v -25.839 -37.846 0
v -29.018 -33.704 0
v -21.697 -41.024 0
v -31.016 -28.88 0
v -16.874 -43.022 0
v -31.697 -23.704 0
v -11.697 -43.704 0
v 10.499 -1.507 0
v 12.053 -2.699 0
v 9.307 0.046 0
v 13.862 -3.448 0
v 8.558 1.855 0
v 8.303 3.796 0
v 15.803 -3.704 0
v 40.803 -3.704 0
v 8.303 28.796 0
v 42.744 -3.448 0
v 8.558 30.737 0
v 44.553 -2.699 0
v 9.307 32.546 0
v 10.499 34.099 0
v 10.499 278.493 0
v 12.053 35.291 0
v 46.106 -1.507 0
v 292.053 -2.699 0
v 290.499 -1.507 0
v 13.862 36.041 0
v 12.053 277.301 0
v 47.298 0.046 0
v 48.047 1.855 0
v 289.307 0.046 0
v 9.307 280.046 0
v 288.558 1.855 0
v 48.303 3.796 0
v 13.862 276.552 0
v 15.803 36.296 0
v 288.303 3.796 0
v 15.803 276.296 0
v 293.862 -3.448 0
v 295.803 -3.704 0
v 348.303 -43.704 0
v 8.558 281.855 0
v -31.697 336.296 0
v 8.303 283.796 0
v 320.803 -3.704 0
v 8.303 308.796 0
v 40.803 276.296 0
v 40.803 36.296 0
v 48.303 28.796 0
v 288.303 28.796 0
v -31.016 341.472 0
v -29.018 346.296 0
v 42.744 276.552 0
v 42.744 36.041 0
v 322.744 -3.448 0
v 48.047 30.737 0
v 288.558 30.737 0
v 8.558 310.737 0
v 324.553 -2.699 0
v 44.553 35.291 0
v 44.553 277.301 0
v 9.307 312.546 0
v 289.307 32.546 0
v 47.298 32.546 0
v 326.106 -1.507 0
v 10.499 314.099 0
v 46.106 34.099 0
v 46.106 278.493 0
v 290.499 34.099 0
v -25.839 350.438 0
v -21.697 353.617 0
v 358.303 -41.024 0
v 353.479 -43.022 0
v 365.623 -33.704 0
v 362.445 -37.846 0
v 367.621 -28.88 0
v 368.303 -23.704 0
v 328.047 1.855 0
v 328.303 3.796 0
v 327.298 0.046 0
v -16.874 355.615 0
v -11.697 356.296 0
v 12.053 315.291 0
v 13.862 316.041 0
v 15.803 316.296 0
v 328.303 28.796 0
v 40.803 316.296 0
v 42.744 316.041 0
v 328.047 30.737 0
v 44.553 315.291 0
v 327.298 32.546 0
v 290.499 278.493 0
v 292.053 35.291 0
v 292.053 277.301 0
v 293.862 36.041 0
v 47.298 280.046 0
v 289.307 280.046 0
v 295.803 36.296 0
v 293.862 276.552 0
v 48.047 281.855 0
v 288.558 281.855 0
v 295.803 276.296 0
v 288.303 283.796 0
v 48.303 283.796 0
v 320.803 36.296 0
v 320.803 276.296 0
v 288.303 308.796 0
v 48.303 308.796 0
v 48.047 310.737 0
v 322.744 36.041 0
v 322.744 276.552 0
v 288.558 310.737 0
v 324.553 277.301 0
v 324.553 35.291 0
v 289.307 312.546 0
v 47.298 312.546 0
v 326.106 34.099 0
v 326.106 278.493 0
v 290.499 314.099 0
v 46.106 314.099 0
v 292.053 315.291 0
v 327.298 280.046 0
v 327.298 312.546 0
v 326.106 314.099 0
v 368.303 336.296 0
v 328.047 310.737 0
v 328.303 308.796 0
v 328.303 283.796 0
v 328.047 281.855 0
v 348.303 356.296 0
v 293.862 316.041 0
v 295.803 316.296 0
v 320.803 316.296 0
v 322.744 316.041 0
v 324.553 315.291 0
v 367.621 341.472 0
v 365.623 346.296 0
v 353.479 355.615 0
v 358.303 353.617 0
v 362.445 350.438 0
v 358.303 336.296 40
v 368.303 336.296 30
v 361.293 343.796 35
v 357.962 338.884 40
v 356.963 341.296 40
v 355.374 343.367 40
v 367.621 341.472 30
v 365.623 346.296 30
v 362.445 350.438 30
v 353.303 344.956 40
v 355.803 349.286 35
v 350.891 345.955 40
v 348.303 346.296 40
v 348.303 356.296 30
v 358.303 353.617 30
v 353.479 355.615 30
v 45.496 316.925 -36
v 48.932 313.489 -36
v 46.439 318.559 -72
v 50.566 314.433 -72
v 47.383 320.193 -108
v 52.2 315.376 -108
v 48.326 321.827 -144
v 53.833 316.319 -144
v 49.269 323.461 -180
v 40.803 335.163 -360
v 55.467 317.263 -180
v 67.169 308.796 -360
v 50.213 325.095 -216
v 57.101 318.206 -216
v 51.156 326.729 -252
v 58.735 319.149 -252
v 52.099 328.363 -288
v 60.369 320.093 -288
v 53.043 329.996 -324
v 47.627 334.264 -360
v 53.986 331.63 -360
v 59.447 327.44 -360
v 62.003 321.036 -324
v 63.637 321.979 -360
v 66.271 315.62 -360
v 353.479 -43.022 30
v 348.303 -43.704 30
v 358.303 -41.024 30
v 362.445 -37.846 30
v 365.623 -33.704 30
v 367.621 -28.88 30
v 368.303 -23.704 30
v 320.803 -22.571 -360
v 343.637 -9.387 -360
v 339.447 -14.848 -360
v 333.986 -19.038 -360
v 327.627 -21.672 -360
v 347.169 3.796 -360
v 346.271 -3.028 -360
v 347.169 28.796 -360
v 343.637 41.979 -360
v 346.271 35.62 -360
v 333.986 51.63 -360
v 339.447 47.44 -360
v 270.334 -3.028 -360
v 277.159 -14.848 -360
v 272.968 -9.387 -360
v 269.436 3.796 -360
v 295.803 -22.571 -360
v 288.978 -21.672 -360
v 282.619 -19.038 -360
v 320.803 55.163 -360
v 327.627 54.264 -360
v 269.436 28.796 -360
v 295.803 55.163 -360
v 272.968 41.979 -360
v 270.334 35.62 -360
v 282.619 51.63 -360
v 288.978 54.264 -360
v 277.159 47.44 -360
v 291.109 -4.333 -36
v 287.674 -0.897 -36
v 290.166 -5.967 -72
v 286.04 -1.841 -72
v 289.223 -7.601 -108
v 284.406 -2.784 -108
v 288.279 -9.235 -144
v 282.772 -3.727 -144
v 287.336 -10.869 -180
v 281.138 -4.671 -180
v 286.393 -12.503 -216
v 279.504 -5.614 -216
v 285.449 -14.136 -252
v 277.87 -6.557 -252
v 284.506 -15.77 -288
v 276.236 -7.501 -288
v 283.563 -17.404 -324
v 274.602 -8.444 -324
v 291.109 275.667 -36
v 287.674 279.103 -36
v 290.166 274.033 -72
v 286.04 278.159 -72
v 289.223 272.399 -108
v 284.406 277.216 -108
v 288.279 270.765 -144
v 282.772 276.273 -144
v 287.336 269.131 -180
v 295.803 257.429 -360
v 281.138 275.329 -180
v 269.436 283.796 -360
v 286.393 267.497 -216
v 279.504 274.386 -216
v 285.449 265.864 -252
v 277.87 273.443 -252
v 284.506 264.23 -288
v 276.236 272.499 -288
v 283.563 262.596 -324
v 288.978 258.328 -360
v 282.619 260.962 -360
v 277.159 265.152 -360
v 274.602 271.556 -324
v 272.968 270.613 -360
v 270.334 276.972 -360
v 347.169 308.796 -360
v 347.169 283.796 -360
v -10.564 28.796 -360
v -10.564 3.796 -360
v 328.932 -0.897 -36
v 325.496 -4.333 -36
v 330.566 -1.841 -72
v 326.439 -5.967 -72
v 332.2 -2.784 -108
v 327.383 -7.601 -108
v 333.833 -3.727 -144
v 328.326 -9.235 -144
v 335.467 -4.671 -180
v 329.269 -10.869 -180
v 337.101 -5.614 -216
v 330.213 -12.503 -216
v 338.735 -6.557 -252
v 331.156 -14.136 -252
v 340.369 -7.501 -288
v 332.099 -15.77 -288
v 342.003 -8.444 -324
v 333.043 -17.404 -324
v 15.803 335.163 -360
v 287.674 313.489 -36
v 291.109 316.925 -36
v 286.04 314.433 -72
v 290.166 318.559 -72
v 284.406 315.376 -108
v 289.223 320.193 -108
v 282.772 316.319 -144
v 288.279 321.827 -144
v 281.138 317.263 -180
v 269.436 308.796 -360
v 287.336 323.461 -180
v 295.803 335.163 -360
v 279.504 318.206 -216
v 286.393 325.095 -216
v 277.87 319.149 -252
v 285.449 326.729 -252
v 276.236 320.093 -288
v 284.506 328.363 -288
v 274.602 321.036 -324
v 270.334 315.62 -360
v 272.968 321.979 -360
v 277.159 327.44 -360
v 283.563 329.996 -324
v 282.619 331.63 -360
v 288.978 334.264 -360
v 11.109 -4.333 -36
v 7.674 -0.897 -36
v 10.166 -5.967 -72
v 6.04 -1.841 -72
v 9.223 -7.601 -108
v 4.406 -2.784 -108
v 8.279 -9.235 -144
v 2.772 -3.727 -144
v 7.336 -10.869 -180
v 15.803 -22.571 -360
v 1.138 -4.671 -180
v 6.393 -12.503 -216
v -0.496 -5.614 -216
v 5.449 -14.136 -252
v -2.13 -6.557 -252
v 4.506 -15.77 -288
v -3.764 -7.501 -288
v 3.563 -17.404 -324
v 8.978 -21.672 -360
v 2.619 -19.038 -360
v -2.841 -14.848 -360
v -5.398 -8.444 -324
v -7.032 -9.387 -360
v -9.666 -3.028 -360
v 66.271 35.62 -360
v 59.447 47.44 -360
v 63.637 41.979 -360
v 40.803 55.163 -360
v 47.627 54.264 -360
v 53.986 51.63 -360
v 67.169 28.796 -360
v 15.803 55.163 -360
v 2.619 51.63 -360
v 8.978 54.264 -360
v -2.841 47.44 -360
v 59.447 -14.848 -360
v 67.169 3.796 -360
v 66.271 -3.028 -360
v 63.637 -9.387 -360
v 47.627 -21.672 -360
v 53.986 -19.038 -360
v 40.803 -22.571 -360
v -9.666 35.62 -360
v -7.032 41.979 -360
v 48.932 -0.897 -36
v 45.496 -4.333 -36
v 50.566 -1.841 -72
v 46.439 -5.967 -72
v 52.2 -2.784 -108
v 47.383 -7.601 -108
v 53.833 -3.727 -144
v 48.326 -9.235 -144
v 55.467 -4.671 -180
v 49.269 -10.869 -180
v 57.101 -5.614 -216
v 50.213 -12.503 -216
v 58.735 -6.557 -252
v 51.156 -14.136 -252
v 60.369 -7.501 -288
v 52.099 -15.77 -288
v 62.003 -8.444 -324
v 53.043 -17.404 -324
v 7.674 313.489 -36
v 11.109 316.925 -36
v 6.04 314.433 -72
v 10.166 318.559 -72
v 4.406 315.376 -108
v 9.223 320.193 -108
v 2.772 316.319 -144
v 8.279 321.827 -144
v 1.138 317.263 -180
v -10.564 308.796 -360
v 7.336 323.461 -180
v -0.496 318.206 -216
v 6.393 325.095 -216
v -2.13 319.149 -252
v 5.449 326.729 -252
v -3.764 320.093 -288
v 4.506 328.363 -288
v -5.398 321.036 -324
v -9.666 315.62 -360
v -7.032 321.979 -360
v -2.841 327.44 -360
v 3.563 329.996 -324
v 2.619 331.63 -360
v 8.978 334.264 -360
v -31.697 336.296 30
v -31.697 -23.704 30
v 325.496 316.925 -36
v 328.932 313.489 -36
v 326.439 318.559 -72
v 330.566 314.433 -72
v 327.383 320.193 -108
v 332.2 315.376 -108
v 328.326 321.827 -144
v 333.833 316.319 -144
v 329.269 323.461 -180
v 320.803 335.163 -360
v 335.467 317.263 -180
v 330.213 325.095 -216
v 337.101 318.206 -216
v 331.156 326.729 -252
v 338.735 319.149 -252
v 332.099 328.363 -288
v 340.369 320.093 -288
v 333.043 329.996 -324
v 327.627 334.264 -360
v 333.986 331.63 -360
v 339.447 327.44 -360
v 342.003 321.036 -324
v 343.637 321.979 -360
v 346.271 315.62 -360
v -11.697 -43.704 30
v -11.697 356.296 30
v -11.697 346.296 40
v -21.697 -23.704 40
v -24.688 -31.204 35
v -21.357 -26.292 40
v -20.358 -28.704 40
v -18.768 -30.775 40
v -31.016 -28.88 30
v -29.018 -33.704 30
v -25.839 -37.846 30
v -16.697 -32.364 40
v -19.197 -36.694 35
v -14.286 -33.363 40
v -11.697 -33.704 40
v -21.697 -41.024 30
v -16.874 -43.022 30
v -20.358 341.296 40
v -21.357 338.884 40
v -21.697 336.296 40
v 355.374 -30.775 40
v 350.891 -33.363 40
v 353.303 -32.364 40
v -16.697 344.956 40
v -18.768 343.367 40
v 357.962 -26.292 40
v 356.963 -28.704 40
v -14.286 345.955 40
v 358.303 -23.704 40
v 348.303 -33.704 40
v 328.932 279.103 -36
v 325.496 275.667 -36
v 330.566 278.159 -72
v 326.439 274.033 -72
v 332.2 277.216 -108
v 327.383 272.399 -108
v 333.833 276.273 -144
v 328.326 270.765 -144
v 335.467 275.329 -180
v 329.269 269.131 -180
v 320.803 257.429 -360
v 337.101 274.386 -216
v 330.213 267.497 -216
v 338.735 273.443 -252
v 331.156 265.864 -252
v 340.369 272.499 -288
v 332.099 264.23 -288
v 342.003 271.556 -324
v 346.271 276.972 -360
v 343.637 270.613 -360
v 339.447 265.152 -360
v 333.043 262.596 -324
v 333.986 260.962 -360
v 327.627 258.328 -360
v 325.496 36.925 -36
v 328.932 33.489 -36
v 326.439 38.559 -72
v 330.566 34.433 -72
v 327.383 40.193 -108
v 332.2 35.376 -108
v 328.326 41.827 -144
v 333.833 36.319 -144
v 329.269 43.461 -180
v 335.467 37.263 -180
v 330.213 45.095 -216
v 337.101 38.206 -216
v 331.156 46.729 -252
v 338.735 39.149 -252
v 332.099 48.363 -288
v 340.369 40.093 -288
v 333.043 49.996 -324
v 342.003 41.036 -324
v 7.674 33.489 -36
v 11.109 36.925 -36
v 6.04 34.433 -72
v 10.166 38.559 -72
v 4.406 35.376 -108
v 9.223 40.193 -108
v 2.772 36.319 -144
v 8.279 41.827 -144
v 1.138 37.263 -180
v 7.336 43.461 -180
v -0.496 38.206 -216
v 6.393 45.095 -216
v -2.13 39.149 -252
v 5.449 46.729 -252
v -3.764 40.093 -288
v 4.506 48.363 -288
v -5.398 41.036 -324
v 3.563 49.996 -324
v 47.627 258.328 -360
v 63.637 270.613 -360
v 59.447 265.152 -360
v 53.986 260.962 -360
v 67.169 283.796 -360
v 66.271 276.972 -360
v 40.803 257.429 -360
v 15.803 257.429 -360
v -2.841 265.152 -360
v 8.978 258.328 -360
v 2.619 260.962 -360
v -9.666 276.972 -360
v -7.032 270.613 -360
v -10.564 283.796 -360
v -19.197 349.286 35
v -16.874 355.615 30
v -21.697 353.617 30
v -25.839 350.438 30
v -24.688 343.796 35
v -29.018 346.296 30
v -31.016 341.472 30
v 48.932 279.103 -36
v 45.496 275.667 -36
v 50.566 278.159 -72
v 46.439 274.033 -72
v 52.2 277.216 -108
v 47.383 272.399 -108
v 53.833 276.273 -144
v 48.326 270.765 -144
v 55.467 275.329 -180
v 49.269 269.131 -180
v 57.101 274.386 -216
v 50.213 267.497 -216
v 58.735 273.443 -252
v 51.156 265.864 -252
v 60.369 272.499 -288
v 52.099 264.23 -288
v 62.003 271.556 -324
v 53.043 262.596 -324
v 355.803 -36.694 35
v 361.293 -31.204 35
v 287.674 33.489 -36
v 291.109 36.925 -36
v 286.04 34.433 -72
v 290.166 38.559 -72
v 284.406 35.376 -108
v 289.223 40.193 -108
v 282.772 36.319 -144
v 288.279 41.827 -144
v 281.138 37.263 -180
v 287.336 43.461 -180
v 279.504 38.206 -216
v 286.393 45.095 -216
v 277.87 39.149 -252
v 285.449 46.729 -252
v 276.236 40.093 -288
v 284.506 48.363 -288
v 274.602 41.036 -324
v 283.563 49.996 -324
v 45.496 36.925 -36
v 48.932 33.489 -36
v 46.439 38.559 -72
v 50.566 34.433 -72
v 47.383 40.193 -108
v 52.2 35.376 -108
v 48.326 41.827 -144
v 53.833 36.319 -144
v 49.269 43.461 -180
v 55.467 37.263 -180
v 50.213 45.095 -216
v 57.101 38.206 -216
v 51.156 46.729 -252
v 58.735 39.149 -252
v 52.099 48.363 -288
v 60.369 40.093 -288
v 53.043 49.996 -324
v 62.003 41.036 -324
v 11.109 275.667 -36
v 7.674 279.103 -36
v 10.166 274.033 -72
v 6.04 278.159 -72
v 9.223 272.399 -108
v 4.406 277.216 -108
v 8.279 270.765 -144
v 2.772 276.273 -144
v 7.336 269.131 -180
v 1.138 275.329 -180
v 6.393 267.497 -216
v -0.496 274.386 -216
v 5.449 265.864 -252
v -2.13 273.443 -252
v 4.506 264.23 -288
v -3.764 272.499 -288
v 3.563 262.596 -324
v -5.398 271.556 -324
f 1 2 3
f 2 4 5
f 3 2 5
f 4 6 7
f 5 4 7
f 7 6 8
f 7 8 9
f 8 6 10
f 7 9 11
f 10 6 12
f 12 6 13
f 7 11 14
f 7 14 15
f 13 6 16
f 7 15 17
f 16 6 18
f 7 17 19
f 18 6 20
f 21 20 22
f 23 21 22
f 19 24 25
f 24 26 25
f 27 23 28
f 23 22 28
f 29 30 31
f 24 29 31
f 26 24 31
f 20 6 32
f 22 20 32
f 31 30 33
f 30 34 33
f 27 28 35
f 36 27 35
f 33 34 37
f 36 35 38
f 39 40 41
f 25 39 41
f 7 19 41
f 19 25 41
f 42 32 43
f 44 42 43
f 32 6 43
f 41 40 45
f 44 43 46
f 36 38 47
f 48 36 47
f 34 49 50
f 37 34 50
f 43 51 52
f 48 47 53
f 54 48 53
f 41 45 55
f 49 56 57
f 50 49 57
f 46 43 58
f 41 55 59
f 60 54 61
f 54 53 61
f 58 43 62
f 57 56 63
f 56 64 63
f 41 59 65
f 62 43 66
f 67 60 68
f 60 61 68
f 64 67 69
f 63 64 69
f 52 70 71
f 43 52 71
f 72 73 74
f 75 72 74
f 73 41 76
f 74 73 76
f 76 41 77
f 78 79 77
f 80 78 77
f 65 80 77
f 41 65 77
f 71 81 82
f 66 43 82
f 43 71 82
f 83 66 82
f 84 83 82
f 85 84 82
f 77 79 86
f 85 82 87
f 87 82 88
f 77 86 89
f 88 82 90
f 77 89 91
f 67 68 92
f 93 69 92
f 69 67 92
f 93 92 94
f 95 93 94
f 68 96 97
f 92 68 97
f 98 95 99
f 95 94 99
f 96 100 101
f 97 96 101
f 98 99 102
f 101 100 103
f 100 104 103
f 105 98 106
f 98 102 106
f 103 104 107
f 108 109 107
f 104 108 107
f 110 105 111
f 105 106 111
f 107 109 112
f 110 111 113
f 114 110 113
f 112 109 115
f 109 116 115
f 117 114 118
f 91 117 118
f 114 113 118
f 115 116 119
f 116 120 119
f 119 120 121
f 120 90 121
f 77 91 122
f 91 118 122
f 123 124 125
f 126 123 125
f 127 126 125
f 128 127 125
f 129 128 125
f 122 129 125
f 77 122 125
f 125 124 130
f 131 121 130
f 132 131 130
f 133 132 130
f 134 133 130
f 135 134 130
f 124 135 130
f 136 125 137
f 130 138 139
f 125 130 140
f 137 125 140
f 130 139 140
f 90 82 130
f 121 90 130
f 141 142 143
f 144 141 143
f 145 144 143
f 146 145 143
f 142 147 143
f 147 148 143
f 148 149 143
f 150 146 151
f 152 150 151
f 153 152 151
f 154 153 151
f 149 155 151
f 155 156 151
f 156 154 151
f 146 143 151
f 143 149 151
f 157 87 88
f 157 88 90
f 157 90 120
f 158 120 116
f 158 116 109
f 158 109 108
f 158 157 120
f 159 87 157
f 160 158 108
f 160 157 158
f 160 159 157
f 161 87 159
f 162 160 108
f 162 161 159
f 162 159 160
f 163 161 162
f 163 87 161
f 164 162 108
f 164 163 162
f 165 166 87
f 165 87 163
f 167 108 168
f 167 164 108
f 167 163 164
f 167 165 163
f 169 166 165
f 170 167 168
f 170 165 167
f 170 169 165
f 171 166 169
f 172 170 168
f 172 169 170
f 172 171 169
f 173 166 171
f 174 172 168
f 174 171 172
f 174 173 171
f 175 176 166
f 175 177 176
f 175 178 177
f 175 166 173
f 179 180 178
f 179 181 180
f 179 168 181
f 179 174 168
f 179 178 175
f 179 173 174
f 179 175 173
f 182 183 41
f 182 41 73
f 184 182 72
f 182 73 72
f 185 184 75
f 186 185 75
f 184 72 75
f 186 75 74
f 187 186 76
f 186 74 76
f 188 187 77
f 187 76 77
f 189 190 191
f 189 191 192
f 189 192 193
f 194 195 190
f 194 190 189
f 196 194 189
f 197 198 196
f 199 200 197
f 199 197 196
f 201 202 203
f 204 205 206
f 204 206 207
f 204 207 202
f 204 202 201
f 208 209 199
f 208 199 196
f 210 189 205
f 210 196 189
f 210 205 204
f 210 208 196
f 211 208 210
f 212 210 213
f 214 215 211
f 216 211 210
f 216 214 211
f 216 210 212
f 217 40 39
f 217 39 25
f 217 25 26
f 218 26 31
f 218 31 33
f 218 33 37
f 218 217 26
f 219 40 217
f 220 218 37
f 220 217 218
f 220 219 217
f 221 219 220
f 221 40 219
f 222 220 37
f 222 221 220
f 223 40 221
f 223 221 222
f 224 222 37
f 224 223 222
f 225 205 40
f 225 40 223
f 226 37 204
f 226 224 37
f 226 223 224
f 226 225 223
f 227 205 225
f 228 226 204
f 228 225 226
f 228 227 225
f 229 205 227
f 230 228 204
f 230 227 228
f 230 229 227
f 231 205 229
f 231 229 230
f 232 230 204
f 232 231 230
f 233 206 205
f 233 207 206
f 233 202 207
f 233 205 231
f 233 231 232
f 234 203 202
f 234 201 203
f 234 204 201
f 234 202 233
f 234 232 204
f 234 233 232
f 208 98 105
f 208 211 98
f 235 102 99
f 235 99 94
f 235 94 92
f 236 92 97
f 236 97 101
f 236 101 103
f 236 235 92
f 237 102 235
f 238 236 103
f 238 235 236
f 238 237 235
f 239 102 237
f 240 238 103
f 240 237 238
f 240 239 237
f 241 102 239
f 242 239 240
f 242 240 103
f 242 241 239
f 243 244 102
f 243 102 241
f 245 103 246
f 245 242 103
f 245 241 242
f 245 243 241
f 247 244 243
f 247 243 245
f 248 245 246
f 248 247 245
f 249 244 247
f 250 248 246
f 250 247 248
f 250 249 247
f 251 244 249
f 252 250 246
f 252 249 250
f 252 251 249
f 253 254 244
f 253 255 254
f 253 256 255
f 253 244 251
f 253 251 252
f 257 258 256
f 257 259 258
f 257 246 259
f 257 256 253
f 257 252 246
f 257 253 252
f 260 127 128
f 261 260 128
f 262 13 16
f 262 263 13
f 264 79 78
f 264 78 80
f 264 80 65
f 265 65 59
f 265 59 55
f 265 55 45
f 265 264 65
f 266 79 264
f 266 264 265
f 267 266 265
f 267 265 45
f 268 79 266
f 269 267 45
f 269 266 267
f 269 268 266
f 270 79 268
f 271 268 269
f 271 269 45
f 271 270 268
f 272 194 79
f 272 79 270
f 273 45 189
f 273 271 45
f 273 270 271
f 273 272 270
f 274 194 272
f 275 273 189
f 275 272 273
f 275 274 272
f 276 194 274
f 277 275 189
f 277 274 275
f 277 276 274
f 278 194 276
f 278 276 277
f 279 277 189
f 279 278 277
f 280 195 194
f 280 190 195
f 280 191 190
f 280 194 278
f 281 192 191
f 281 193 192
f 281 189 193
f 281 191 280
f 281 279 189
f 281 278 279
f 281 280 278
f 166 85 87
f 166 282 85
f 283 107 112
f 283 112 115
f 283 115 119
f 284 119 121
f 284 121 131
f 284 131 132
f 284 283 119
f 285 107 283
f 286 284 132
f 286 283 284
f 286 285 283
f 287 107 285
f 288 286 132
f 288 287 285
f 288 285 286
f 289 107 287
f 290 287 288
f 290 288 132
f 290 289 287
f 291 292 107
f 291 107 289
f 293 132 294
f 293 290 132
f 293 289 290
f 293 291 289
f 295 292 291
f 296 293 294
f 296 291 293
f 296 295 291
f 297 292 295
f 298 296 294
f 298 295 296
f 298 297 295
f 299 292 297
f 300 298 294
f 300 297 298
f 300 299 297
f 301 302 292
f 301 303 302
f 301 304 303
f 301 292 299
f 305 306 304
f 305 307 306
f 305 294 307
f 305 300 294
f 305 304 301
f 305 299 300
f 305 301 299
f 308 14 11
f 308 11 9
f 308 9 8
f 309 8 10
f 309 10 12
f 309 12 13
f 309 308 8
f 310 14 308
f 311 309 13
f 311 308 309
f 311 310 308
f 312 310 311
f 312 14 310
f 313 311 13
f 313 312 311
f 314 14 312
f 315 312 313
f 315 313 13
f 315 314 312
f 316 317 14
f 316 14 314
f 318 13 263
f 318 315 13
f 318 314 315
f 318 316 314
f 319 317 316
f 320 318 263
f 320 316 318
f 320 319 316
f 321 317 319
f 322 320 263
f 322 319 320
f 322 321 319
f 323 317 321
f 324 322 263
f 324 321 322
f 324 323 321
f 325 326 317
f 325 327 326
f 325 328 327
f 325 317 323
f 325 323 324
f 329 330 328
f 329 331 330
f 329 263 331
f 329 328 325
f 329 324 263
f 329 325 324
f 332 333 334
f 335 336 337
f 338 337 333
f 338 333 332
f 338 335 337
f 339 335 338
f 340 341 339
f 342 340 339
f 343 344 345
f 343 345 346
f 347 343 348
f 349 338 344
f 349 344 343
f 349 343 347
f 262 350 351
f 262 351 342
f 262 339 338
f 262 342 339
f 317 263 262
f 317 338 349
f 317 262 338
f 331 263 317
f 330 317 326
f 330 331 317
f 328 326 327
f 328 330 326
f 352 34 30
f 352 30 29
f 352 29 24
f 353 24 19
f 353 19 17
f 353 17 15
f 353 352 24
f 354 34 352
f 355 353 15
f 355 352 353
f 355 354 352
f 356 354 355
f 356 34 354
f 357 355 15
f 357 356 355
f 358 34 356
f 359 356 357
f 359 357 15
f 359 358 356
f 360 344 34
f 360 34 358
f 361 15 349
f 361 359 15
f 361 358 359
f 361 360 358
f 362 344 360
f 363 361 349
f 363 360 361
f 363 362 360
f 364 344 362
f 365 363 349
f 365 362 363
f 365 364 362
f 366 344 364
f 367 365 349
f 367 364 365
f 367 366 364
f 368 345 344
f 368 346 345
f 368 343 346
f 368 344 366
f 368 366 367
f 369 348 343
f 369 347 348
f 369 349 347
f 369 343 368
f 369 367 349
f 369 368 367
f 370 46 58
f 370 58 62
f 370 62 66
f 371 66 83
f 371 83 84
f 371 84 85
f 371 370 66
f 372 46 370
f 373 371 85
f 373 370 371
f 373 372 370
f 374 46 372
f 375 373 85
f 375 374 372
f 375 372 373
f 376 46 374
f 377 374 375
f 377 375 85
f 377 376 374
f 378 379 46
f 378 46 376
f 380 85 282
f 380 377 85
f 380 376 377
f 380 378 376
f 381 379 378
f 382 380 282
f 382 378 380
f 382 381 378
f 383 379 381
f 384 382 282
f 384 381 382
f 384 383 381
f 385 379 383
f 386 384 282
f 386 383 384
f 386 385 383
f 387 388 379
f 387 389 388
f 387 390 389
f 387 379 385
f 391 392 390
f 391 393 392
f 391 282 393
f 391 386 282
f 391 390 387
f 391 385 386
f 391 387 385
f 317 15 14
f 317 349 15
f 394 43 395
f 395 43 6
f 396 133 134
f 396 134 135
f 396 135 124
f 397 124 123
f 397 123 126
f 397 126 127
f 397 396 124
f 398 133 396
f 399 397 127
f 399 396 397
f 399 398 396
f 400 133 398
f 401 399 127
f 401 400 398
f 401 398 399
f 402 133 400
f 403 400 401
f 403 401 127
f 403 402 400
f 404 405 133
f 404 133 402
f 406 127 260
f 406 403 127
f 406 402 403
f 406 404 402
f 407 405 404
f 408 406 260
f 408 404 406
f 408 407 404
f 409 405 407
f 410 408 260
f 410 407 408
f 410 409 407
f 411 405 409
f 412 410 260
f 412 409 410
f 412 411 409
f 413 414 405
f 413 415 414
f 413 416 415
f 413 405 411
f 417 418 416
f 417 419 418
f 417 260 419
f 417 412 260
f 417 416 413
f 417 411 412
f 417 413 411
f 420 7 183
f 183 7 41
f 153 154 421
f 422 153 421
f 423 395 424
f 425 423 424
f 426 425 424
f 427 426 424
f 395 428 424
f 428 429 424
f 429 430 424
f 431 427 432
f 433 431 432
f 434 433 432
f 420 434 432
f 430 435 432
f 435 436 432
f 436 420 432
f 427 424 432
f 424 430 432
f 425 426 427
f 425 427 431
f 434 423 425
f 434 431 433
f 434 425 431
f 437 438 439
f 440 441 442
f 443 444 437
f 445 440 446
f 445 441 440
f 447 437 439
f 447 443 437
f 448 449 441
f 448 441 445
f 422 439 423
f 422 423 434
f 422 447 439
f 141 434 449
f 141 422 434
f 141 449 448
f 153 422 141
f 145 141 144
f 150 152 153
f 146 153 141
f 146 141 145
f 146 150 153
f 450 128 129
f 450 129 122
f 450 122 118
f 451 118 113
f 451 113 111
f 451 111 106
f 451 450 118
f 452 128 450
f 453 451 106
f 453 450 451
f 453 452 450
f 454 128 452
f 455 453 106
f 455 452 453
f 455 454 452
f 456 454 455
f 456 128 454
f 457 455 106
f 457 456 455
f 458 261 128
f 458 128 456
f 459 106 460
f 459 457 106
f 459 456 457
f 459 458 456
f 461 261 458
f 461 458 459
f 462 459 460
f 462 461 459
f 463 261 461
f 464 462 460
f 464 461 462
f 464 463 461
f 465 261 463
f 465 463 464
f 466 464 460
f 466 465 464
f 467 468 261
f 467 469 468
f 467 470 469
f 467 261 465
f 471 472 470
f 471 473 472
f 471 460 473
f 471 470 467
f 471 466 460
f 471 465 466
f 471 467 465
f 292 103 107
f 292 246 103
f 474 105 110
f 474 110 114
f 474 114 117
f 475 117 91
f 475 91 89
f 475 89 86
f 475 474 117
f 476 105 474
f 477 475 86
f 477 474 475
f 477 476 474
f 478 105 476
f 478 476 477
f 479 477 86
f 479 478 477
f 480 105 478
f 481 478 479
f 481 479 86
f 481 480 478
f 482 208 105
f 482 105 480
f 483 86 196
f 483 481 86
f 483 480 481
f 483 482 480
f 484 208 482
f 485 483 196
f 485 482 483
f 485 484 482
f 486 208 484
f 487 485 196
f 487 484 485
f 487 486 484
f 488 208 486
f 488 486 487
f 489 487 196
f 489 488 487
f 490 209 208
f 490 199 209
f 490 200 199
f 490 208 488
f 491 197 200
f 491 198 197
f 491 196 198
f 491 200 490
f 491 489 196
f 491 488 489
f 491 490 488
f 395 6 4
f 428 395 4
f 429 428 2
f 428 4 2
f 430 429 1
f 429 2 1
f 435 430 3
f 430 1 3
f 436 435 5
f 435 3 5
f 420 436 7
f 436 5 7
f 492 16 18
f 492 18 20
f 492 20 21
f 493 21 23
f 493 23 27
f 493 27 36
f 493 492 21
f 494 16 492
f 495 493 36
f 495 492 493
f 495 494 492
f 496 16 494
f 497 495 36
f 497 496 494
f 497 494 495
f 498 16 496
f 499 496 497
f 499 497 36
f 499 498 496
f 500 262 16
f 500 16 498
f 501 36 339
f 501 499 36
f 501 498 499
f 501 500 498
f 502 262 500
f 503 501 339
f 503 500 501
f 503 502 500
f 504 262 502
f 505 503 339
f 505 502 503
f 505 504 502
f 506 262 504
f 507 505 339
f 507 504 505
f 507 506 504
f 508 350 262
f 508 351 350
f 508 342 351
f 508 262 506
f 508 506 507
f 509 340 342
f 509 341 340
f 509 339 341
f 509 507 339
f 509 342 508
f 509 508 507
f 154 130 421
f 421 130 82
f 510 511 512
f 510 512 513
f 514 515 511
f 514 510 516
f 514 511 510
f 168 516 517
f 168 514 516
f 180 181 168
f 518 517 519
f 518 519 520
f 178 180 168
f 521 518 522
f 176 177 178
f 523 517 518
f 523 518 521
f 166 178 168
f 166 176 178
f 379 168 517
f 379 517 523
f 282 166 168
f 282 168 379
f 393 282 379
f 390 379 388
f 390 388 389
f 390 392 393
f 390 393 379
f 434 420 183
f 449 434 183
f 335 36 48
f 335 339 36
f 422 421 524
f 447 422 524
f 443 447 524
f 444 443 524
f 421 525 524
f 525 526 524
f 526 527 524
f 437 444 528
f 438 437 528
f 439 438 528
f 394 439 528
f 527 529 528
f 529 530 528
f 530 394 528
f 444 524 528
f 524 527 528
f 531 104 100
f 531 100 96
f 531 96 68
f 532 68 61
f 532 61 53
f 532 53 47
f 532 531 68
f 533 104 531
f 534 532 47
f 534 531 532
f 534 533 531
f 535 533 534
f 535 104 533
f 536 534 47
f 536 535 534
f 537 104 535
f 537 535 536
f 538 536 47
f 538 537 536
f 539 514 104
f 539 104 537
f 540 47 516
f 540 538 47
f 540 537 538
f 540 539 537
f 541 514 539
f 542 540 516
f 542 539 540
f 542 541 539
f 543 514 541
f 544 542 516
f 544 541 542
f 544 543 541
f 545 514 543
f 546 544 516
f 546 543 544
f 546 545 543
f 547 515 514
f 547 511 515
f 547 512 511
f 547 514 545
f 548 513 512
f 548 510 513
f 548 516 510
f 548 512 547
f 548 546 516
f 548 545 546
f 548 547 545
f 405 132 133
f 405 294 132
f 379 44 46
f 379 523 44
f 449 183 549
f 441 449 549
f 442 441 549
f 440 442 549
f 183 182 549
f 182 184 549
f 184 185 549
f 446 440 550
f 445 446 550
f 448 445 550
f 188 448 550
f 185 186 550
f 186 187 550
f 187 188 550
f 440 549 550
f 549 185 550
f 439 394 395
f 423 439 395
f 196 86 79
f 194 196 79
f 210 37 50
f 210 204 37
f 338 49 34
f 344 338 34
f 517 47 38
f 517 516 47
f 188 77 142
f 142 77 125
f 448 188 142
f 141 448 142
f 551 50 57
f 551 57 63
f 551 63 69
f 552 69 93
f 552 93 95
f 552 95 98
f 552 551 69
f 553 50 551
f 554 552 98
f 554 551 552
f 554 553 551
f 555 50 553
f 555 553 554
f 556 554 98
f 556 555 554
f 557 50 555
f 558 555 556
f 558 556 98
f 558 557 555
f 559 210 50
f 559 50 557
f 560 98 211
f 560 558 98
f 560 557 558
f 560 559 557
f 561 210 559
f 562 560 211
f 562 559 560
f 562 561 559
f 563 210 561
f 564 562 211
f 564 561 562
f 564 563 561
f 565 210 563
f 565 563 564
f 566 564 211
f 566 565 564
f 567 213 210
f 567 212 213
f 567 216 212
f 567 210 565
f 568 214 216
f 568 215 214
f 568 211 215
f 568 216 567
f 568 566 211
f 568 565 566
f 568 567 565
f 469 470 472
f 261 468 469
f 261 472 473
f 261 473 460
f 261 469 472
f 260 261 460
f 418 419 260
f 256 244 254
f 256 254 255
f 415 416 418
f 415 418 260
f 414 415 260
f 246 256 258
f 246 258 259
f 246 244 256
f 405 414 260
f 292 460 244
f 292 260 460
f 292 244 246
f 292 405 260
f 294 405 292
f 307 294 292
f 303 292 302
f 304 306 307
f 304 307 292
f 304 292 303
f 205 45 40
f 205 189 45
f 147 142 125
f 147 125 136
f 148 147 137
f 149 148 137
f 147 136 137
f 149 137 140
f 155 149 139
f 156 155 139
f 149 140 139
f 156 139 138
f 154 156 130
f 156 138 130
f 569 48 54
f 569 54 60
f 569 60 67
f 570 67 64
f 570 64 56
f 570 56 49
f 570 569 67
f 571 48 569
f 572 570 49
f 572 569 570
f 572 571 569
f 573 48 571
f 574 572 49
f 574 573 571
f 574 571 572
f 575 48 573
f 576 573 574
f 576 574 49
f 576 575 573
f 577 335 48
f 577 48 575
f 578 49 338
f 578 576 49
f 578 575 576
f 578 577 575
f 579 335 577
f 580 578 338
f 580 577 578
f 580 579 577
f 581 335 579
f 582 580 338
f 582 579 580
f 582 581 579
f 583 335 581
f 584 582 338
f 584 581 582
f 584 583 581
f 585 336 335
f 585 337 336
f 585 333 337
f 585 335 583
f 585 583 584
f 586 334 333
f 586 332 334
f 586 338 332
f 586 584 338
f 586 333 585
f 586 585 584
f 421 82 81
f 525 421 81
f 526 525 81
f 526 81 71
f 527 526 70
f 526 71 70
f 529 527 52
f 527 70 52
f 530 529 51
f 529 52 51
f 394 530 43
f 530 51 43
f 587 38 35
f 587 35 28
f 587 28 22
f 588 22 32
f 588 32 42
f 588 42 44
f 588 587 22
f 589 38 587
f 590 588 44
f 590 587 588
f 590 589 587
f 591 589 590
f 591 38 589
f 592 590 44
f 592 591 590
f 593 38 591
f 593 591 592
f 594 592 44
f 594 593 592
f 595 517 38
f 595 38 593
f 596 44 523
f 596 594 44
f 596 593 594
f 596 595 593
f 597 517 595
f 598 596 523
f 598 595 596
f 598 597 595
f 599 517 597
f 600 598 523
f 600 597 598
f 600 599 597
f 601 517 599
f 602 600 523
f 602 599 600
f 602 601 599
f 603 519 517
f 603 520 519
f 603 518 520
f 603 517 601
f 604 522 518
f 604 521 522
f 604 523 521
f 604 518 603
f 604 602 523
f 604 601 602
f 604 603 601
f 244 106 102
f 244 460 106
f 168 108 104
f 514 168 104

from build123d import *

# Parameters (mm, degrees)
F1_DEPTH = 40
F3_DEPTH = 360
F3_TAPER = -3
F4_SIZE  = 10


with BuildPart() as f1:
    # F0 (on Top) → F1 (new body)
    with BuildSketch(Plane.XY):
        with BuildLine():
            Line((348.3026485145, 356.2960825861), (-11.6973514855, 356.2960825861))
            ThreePointArc((-11.6973514855, 356.2960825861), (-25.8394871092, 350.4382182098), (-31.6973514855, 336.2960825861))
            Line((-31.6973514855, 336.2960825861), (-31.6973514855, -23.7039174139))
            ThreePointArc((-31.6973514855, -23.7039174139), (-25.8394871092, -37.8460530377), (-11.6973514855, -43.7039174139))
            Line((-11.6973514855, -43.7039174139), (348.3026485145, -43.7039174139))
            ThreePointArc((348.3026485145, -43.7039174139), (362.4447841382, -37.8460530377), (368.3026485145, -23.7039174139))
            Line((368.3026485145, -23.7039174139), (368.3026485145, 336.2960825861))
            ThreePointArc((368.3026485145, 336.2960825861), (362.4447841382, 350.4382182098), (348.3026485145, 356.2960825861))
        make_face()
    extrude(amount=F1_DEPTH)

    # F2 (on face) → F3 (join)
    with BuildSketch(Plane(origin=(0, 0, 0), x_dir=(1, 0, 0), z_dir=(0, 0, -1))):
        with BuildLine():
            Line((40.8026485145, 3.7039174139), (15.8026485145, 3.7039174139))
            ThreePointArc((15.8026485145, 3.7039174139), (10.4993476556, 1.5072182728), (8.3026485145, -3.7960825861))
            Line((8.3026485145, -3.7960825861), (8.3026485145, -28.7960825861))
            ThreePointArc((8.3026485145, -28.7960825861), (10.4993476556, -34.0993834449), (15.8026485145, -36.2960825861))
            Line((15.8026485145, -36.2960825861), (40.8026485145, -36.2960825861))
            ThreePointArc((40.8026485145, -36.2960825861), (46.1059493734, -34.0993834449), (48.3026485145, -28.7960825861))
            Line((48.3026485145, -28.7960825861), (48.3026485145, -3.7960825861))
            ThreePointArc((48.3026485145, -3.7960825861), (46.1059493734, 1.5072182728), (40.8026485145, 3.7039174139))
        make_face()
        with BuildLine():
            ThreePointArc((288.3026485145, -28.7960825861), (290.4993476556, -34.0993834449), (295.8026485145, -36.2960825861))
            Line((295.8026485145, -36.2960825861), (320.8026485145, -36.2960825861))
            ThreePointArc((320.8026485145, -36.2960825861), (326.1059493734, -34.0993834449), (328.3026485145, -28.7960825861))
            Line((328.3026485145, -28.7960825861), (328.3026485145, -3.7960825861))
            ThreePointArc((328.3026485145, -3.7960825861), (326.1059493734, 1.5072182728), (320.8026485145, 3.7039174139))
            Line((320.8026485145, 3.7039174139), (295.8026485145, 3.7039174139))
            ThreePointArc((295.8026485145, 3.7039174139), (290.4993476556, 1.5072182728), (288.3026485145, -3.7960825861))
            Line((288.3026485145, -3.7960825861), (288.3026485145, -28.7960825861))
        make_face()
        with BuildLine():
            ThreePointArc((288.3026485145, -308.7960825861), (290.4993476556, -314.0993834449), (295.8026485145, -316.2960825861))
            Line((295.8026485145, -316.2960825861), (320.8026485145, -316.2960825861))
            ThreePointArc((320.8026485145, -316.2960825861), (326.1059493734, -314.0993834449), (328.3026485145, -308.7960825861))
            Line((328.3026485145, -308.7960825861), (328.3026485145, -283.7960825861))
            ThreePointArc((328.3026485145, -283.7960825861), (326.1059493734, -278.4927817272), (320.8026485145, -276.2960825861))
            Line((320.8026485145, -276.2960825861), (295.8026485145, -276.2960825861))
            ThreePointArc((295.8026485145, -276.2960825861), (290.4993476556, -278.4927817272), (288.3026485145, -283.7960825861))
            Line((288.3026485145, -283.7960825861), (288.3026485145, -308.7960825861))
        make_face()
        with BuildLine():
            ThreePointArc((8.3026485145, -308.7960825861), (10.4993476556, -314.0993834449), (15.8026485145, -316.2960825861))
            Line((15.8026485145, -316.2960825861), (40.8026485145, -316.2960825861))
            ThreePointArc((40.8026485145, -316.2960825861), (46.1059493734, -314.0993834449), (48.3026485145, -308.7960825861))
            Line((48.3026485145, -308.7960825861), (48.3026485145, -283.7960825861))
            ThreePointArc((48.3026485145, -283.7960825861), (46.1059493734, -278.4927817272), (40.8026485145, -276.2960825861))
            Line((40.8026485145, -276.2960825861), (15.8026485145, -276.2960825861))
            ThreePointArc((15.8026485145, -276.2960825861), (10.4993476556, -278.4927817272), (8.3026485145, -283.7960825861))
            Line((8.3026485145, -283.7960825861), (8.3026485145, -308.7960825861))
        make_face()
    extrude(amount=F3_DEPTH, taper=F3_TAPER)

    # F4
    f4_edges = [f1.edges().sort_by_distance(p)[0] for p in [
        (368.302649, 156.296083, 40),
        (362.444784, 350.438218, 40),
        (168.302649, 356.296083, 40),
        (-25.839487, 350.438218, 40),
        (-31.697351, 156.296083, 40),
        (-25.839487, -37.846053, 40),
        (168.302649, -43.703917, 40),
        (362.444784, -37.846053, 40),
    ]]
    chamfer(f4_edges, length=F4_SIZE)


solid = f1.part
